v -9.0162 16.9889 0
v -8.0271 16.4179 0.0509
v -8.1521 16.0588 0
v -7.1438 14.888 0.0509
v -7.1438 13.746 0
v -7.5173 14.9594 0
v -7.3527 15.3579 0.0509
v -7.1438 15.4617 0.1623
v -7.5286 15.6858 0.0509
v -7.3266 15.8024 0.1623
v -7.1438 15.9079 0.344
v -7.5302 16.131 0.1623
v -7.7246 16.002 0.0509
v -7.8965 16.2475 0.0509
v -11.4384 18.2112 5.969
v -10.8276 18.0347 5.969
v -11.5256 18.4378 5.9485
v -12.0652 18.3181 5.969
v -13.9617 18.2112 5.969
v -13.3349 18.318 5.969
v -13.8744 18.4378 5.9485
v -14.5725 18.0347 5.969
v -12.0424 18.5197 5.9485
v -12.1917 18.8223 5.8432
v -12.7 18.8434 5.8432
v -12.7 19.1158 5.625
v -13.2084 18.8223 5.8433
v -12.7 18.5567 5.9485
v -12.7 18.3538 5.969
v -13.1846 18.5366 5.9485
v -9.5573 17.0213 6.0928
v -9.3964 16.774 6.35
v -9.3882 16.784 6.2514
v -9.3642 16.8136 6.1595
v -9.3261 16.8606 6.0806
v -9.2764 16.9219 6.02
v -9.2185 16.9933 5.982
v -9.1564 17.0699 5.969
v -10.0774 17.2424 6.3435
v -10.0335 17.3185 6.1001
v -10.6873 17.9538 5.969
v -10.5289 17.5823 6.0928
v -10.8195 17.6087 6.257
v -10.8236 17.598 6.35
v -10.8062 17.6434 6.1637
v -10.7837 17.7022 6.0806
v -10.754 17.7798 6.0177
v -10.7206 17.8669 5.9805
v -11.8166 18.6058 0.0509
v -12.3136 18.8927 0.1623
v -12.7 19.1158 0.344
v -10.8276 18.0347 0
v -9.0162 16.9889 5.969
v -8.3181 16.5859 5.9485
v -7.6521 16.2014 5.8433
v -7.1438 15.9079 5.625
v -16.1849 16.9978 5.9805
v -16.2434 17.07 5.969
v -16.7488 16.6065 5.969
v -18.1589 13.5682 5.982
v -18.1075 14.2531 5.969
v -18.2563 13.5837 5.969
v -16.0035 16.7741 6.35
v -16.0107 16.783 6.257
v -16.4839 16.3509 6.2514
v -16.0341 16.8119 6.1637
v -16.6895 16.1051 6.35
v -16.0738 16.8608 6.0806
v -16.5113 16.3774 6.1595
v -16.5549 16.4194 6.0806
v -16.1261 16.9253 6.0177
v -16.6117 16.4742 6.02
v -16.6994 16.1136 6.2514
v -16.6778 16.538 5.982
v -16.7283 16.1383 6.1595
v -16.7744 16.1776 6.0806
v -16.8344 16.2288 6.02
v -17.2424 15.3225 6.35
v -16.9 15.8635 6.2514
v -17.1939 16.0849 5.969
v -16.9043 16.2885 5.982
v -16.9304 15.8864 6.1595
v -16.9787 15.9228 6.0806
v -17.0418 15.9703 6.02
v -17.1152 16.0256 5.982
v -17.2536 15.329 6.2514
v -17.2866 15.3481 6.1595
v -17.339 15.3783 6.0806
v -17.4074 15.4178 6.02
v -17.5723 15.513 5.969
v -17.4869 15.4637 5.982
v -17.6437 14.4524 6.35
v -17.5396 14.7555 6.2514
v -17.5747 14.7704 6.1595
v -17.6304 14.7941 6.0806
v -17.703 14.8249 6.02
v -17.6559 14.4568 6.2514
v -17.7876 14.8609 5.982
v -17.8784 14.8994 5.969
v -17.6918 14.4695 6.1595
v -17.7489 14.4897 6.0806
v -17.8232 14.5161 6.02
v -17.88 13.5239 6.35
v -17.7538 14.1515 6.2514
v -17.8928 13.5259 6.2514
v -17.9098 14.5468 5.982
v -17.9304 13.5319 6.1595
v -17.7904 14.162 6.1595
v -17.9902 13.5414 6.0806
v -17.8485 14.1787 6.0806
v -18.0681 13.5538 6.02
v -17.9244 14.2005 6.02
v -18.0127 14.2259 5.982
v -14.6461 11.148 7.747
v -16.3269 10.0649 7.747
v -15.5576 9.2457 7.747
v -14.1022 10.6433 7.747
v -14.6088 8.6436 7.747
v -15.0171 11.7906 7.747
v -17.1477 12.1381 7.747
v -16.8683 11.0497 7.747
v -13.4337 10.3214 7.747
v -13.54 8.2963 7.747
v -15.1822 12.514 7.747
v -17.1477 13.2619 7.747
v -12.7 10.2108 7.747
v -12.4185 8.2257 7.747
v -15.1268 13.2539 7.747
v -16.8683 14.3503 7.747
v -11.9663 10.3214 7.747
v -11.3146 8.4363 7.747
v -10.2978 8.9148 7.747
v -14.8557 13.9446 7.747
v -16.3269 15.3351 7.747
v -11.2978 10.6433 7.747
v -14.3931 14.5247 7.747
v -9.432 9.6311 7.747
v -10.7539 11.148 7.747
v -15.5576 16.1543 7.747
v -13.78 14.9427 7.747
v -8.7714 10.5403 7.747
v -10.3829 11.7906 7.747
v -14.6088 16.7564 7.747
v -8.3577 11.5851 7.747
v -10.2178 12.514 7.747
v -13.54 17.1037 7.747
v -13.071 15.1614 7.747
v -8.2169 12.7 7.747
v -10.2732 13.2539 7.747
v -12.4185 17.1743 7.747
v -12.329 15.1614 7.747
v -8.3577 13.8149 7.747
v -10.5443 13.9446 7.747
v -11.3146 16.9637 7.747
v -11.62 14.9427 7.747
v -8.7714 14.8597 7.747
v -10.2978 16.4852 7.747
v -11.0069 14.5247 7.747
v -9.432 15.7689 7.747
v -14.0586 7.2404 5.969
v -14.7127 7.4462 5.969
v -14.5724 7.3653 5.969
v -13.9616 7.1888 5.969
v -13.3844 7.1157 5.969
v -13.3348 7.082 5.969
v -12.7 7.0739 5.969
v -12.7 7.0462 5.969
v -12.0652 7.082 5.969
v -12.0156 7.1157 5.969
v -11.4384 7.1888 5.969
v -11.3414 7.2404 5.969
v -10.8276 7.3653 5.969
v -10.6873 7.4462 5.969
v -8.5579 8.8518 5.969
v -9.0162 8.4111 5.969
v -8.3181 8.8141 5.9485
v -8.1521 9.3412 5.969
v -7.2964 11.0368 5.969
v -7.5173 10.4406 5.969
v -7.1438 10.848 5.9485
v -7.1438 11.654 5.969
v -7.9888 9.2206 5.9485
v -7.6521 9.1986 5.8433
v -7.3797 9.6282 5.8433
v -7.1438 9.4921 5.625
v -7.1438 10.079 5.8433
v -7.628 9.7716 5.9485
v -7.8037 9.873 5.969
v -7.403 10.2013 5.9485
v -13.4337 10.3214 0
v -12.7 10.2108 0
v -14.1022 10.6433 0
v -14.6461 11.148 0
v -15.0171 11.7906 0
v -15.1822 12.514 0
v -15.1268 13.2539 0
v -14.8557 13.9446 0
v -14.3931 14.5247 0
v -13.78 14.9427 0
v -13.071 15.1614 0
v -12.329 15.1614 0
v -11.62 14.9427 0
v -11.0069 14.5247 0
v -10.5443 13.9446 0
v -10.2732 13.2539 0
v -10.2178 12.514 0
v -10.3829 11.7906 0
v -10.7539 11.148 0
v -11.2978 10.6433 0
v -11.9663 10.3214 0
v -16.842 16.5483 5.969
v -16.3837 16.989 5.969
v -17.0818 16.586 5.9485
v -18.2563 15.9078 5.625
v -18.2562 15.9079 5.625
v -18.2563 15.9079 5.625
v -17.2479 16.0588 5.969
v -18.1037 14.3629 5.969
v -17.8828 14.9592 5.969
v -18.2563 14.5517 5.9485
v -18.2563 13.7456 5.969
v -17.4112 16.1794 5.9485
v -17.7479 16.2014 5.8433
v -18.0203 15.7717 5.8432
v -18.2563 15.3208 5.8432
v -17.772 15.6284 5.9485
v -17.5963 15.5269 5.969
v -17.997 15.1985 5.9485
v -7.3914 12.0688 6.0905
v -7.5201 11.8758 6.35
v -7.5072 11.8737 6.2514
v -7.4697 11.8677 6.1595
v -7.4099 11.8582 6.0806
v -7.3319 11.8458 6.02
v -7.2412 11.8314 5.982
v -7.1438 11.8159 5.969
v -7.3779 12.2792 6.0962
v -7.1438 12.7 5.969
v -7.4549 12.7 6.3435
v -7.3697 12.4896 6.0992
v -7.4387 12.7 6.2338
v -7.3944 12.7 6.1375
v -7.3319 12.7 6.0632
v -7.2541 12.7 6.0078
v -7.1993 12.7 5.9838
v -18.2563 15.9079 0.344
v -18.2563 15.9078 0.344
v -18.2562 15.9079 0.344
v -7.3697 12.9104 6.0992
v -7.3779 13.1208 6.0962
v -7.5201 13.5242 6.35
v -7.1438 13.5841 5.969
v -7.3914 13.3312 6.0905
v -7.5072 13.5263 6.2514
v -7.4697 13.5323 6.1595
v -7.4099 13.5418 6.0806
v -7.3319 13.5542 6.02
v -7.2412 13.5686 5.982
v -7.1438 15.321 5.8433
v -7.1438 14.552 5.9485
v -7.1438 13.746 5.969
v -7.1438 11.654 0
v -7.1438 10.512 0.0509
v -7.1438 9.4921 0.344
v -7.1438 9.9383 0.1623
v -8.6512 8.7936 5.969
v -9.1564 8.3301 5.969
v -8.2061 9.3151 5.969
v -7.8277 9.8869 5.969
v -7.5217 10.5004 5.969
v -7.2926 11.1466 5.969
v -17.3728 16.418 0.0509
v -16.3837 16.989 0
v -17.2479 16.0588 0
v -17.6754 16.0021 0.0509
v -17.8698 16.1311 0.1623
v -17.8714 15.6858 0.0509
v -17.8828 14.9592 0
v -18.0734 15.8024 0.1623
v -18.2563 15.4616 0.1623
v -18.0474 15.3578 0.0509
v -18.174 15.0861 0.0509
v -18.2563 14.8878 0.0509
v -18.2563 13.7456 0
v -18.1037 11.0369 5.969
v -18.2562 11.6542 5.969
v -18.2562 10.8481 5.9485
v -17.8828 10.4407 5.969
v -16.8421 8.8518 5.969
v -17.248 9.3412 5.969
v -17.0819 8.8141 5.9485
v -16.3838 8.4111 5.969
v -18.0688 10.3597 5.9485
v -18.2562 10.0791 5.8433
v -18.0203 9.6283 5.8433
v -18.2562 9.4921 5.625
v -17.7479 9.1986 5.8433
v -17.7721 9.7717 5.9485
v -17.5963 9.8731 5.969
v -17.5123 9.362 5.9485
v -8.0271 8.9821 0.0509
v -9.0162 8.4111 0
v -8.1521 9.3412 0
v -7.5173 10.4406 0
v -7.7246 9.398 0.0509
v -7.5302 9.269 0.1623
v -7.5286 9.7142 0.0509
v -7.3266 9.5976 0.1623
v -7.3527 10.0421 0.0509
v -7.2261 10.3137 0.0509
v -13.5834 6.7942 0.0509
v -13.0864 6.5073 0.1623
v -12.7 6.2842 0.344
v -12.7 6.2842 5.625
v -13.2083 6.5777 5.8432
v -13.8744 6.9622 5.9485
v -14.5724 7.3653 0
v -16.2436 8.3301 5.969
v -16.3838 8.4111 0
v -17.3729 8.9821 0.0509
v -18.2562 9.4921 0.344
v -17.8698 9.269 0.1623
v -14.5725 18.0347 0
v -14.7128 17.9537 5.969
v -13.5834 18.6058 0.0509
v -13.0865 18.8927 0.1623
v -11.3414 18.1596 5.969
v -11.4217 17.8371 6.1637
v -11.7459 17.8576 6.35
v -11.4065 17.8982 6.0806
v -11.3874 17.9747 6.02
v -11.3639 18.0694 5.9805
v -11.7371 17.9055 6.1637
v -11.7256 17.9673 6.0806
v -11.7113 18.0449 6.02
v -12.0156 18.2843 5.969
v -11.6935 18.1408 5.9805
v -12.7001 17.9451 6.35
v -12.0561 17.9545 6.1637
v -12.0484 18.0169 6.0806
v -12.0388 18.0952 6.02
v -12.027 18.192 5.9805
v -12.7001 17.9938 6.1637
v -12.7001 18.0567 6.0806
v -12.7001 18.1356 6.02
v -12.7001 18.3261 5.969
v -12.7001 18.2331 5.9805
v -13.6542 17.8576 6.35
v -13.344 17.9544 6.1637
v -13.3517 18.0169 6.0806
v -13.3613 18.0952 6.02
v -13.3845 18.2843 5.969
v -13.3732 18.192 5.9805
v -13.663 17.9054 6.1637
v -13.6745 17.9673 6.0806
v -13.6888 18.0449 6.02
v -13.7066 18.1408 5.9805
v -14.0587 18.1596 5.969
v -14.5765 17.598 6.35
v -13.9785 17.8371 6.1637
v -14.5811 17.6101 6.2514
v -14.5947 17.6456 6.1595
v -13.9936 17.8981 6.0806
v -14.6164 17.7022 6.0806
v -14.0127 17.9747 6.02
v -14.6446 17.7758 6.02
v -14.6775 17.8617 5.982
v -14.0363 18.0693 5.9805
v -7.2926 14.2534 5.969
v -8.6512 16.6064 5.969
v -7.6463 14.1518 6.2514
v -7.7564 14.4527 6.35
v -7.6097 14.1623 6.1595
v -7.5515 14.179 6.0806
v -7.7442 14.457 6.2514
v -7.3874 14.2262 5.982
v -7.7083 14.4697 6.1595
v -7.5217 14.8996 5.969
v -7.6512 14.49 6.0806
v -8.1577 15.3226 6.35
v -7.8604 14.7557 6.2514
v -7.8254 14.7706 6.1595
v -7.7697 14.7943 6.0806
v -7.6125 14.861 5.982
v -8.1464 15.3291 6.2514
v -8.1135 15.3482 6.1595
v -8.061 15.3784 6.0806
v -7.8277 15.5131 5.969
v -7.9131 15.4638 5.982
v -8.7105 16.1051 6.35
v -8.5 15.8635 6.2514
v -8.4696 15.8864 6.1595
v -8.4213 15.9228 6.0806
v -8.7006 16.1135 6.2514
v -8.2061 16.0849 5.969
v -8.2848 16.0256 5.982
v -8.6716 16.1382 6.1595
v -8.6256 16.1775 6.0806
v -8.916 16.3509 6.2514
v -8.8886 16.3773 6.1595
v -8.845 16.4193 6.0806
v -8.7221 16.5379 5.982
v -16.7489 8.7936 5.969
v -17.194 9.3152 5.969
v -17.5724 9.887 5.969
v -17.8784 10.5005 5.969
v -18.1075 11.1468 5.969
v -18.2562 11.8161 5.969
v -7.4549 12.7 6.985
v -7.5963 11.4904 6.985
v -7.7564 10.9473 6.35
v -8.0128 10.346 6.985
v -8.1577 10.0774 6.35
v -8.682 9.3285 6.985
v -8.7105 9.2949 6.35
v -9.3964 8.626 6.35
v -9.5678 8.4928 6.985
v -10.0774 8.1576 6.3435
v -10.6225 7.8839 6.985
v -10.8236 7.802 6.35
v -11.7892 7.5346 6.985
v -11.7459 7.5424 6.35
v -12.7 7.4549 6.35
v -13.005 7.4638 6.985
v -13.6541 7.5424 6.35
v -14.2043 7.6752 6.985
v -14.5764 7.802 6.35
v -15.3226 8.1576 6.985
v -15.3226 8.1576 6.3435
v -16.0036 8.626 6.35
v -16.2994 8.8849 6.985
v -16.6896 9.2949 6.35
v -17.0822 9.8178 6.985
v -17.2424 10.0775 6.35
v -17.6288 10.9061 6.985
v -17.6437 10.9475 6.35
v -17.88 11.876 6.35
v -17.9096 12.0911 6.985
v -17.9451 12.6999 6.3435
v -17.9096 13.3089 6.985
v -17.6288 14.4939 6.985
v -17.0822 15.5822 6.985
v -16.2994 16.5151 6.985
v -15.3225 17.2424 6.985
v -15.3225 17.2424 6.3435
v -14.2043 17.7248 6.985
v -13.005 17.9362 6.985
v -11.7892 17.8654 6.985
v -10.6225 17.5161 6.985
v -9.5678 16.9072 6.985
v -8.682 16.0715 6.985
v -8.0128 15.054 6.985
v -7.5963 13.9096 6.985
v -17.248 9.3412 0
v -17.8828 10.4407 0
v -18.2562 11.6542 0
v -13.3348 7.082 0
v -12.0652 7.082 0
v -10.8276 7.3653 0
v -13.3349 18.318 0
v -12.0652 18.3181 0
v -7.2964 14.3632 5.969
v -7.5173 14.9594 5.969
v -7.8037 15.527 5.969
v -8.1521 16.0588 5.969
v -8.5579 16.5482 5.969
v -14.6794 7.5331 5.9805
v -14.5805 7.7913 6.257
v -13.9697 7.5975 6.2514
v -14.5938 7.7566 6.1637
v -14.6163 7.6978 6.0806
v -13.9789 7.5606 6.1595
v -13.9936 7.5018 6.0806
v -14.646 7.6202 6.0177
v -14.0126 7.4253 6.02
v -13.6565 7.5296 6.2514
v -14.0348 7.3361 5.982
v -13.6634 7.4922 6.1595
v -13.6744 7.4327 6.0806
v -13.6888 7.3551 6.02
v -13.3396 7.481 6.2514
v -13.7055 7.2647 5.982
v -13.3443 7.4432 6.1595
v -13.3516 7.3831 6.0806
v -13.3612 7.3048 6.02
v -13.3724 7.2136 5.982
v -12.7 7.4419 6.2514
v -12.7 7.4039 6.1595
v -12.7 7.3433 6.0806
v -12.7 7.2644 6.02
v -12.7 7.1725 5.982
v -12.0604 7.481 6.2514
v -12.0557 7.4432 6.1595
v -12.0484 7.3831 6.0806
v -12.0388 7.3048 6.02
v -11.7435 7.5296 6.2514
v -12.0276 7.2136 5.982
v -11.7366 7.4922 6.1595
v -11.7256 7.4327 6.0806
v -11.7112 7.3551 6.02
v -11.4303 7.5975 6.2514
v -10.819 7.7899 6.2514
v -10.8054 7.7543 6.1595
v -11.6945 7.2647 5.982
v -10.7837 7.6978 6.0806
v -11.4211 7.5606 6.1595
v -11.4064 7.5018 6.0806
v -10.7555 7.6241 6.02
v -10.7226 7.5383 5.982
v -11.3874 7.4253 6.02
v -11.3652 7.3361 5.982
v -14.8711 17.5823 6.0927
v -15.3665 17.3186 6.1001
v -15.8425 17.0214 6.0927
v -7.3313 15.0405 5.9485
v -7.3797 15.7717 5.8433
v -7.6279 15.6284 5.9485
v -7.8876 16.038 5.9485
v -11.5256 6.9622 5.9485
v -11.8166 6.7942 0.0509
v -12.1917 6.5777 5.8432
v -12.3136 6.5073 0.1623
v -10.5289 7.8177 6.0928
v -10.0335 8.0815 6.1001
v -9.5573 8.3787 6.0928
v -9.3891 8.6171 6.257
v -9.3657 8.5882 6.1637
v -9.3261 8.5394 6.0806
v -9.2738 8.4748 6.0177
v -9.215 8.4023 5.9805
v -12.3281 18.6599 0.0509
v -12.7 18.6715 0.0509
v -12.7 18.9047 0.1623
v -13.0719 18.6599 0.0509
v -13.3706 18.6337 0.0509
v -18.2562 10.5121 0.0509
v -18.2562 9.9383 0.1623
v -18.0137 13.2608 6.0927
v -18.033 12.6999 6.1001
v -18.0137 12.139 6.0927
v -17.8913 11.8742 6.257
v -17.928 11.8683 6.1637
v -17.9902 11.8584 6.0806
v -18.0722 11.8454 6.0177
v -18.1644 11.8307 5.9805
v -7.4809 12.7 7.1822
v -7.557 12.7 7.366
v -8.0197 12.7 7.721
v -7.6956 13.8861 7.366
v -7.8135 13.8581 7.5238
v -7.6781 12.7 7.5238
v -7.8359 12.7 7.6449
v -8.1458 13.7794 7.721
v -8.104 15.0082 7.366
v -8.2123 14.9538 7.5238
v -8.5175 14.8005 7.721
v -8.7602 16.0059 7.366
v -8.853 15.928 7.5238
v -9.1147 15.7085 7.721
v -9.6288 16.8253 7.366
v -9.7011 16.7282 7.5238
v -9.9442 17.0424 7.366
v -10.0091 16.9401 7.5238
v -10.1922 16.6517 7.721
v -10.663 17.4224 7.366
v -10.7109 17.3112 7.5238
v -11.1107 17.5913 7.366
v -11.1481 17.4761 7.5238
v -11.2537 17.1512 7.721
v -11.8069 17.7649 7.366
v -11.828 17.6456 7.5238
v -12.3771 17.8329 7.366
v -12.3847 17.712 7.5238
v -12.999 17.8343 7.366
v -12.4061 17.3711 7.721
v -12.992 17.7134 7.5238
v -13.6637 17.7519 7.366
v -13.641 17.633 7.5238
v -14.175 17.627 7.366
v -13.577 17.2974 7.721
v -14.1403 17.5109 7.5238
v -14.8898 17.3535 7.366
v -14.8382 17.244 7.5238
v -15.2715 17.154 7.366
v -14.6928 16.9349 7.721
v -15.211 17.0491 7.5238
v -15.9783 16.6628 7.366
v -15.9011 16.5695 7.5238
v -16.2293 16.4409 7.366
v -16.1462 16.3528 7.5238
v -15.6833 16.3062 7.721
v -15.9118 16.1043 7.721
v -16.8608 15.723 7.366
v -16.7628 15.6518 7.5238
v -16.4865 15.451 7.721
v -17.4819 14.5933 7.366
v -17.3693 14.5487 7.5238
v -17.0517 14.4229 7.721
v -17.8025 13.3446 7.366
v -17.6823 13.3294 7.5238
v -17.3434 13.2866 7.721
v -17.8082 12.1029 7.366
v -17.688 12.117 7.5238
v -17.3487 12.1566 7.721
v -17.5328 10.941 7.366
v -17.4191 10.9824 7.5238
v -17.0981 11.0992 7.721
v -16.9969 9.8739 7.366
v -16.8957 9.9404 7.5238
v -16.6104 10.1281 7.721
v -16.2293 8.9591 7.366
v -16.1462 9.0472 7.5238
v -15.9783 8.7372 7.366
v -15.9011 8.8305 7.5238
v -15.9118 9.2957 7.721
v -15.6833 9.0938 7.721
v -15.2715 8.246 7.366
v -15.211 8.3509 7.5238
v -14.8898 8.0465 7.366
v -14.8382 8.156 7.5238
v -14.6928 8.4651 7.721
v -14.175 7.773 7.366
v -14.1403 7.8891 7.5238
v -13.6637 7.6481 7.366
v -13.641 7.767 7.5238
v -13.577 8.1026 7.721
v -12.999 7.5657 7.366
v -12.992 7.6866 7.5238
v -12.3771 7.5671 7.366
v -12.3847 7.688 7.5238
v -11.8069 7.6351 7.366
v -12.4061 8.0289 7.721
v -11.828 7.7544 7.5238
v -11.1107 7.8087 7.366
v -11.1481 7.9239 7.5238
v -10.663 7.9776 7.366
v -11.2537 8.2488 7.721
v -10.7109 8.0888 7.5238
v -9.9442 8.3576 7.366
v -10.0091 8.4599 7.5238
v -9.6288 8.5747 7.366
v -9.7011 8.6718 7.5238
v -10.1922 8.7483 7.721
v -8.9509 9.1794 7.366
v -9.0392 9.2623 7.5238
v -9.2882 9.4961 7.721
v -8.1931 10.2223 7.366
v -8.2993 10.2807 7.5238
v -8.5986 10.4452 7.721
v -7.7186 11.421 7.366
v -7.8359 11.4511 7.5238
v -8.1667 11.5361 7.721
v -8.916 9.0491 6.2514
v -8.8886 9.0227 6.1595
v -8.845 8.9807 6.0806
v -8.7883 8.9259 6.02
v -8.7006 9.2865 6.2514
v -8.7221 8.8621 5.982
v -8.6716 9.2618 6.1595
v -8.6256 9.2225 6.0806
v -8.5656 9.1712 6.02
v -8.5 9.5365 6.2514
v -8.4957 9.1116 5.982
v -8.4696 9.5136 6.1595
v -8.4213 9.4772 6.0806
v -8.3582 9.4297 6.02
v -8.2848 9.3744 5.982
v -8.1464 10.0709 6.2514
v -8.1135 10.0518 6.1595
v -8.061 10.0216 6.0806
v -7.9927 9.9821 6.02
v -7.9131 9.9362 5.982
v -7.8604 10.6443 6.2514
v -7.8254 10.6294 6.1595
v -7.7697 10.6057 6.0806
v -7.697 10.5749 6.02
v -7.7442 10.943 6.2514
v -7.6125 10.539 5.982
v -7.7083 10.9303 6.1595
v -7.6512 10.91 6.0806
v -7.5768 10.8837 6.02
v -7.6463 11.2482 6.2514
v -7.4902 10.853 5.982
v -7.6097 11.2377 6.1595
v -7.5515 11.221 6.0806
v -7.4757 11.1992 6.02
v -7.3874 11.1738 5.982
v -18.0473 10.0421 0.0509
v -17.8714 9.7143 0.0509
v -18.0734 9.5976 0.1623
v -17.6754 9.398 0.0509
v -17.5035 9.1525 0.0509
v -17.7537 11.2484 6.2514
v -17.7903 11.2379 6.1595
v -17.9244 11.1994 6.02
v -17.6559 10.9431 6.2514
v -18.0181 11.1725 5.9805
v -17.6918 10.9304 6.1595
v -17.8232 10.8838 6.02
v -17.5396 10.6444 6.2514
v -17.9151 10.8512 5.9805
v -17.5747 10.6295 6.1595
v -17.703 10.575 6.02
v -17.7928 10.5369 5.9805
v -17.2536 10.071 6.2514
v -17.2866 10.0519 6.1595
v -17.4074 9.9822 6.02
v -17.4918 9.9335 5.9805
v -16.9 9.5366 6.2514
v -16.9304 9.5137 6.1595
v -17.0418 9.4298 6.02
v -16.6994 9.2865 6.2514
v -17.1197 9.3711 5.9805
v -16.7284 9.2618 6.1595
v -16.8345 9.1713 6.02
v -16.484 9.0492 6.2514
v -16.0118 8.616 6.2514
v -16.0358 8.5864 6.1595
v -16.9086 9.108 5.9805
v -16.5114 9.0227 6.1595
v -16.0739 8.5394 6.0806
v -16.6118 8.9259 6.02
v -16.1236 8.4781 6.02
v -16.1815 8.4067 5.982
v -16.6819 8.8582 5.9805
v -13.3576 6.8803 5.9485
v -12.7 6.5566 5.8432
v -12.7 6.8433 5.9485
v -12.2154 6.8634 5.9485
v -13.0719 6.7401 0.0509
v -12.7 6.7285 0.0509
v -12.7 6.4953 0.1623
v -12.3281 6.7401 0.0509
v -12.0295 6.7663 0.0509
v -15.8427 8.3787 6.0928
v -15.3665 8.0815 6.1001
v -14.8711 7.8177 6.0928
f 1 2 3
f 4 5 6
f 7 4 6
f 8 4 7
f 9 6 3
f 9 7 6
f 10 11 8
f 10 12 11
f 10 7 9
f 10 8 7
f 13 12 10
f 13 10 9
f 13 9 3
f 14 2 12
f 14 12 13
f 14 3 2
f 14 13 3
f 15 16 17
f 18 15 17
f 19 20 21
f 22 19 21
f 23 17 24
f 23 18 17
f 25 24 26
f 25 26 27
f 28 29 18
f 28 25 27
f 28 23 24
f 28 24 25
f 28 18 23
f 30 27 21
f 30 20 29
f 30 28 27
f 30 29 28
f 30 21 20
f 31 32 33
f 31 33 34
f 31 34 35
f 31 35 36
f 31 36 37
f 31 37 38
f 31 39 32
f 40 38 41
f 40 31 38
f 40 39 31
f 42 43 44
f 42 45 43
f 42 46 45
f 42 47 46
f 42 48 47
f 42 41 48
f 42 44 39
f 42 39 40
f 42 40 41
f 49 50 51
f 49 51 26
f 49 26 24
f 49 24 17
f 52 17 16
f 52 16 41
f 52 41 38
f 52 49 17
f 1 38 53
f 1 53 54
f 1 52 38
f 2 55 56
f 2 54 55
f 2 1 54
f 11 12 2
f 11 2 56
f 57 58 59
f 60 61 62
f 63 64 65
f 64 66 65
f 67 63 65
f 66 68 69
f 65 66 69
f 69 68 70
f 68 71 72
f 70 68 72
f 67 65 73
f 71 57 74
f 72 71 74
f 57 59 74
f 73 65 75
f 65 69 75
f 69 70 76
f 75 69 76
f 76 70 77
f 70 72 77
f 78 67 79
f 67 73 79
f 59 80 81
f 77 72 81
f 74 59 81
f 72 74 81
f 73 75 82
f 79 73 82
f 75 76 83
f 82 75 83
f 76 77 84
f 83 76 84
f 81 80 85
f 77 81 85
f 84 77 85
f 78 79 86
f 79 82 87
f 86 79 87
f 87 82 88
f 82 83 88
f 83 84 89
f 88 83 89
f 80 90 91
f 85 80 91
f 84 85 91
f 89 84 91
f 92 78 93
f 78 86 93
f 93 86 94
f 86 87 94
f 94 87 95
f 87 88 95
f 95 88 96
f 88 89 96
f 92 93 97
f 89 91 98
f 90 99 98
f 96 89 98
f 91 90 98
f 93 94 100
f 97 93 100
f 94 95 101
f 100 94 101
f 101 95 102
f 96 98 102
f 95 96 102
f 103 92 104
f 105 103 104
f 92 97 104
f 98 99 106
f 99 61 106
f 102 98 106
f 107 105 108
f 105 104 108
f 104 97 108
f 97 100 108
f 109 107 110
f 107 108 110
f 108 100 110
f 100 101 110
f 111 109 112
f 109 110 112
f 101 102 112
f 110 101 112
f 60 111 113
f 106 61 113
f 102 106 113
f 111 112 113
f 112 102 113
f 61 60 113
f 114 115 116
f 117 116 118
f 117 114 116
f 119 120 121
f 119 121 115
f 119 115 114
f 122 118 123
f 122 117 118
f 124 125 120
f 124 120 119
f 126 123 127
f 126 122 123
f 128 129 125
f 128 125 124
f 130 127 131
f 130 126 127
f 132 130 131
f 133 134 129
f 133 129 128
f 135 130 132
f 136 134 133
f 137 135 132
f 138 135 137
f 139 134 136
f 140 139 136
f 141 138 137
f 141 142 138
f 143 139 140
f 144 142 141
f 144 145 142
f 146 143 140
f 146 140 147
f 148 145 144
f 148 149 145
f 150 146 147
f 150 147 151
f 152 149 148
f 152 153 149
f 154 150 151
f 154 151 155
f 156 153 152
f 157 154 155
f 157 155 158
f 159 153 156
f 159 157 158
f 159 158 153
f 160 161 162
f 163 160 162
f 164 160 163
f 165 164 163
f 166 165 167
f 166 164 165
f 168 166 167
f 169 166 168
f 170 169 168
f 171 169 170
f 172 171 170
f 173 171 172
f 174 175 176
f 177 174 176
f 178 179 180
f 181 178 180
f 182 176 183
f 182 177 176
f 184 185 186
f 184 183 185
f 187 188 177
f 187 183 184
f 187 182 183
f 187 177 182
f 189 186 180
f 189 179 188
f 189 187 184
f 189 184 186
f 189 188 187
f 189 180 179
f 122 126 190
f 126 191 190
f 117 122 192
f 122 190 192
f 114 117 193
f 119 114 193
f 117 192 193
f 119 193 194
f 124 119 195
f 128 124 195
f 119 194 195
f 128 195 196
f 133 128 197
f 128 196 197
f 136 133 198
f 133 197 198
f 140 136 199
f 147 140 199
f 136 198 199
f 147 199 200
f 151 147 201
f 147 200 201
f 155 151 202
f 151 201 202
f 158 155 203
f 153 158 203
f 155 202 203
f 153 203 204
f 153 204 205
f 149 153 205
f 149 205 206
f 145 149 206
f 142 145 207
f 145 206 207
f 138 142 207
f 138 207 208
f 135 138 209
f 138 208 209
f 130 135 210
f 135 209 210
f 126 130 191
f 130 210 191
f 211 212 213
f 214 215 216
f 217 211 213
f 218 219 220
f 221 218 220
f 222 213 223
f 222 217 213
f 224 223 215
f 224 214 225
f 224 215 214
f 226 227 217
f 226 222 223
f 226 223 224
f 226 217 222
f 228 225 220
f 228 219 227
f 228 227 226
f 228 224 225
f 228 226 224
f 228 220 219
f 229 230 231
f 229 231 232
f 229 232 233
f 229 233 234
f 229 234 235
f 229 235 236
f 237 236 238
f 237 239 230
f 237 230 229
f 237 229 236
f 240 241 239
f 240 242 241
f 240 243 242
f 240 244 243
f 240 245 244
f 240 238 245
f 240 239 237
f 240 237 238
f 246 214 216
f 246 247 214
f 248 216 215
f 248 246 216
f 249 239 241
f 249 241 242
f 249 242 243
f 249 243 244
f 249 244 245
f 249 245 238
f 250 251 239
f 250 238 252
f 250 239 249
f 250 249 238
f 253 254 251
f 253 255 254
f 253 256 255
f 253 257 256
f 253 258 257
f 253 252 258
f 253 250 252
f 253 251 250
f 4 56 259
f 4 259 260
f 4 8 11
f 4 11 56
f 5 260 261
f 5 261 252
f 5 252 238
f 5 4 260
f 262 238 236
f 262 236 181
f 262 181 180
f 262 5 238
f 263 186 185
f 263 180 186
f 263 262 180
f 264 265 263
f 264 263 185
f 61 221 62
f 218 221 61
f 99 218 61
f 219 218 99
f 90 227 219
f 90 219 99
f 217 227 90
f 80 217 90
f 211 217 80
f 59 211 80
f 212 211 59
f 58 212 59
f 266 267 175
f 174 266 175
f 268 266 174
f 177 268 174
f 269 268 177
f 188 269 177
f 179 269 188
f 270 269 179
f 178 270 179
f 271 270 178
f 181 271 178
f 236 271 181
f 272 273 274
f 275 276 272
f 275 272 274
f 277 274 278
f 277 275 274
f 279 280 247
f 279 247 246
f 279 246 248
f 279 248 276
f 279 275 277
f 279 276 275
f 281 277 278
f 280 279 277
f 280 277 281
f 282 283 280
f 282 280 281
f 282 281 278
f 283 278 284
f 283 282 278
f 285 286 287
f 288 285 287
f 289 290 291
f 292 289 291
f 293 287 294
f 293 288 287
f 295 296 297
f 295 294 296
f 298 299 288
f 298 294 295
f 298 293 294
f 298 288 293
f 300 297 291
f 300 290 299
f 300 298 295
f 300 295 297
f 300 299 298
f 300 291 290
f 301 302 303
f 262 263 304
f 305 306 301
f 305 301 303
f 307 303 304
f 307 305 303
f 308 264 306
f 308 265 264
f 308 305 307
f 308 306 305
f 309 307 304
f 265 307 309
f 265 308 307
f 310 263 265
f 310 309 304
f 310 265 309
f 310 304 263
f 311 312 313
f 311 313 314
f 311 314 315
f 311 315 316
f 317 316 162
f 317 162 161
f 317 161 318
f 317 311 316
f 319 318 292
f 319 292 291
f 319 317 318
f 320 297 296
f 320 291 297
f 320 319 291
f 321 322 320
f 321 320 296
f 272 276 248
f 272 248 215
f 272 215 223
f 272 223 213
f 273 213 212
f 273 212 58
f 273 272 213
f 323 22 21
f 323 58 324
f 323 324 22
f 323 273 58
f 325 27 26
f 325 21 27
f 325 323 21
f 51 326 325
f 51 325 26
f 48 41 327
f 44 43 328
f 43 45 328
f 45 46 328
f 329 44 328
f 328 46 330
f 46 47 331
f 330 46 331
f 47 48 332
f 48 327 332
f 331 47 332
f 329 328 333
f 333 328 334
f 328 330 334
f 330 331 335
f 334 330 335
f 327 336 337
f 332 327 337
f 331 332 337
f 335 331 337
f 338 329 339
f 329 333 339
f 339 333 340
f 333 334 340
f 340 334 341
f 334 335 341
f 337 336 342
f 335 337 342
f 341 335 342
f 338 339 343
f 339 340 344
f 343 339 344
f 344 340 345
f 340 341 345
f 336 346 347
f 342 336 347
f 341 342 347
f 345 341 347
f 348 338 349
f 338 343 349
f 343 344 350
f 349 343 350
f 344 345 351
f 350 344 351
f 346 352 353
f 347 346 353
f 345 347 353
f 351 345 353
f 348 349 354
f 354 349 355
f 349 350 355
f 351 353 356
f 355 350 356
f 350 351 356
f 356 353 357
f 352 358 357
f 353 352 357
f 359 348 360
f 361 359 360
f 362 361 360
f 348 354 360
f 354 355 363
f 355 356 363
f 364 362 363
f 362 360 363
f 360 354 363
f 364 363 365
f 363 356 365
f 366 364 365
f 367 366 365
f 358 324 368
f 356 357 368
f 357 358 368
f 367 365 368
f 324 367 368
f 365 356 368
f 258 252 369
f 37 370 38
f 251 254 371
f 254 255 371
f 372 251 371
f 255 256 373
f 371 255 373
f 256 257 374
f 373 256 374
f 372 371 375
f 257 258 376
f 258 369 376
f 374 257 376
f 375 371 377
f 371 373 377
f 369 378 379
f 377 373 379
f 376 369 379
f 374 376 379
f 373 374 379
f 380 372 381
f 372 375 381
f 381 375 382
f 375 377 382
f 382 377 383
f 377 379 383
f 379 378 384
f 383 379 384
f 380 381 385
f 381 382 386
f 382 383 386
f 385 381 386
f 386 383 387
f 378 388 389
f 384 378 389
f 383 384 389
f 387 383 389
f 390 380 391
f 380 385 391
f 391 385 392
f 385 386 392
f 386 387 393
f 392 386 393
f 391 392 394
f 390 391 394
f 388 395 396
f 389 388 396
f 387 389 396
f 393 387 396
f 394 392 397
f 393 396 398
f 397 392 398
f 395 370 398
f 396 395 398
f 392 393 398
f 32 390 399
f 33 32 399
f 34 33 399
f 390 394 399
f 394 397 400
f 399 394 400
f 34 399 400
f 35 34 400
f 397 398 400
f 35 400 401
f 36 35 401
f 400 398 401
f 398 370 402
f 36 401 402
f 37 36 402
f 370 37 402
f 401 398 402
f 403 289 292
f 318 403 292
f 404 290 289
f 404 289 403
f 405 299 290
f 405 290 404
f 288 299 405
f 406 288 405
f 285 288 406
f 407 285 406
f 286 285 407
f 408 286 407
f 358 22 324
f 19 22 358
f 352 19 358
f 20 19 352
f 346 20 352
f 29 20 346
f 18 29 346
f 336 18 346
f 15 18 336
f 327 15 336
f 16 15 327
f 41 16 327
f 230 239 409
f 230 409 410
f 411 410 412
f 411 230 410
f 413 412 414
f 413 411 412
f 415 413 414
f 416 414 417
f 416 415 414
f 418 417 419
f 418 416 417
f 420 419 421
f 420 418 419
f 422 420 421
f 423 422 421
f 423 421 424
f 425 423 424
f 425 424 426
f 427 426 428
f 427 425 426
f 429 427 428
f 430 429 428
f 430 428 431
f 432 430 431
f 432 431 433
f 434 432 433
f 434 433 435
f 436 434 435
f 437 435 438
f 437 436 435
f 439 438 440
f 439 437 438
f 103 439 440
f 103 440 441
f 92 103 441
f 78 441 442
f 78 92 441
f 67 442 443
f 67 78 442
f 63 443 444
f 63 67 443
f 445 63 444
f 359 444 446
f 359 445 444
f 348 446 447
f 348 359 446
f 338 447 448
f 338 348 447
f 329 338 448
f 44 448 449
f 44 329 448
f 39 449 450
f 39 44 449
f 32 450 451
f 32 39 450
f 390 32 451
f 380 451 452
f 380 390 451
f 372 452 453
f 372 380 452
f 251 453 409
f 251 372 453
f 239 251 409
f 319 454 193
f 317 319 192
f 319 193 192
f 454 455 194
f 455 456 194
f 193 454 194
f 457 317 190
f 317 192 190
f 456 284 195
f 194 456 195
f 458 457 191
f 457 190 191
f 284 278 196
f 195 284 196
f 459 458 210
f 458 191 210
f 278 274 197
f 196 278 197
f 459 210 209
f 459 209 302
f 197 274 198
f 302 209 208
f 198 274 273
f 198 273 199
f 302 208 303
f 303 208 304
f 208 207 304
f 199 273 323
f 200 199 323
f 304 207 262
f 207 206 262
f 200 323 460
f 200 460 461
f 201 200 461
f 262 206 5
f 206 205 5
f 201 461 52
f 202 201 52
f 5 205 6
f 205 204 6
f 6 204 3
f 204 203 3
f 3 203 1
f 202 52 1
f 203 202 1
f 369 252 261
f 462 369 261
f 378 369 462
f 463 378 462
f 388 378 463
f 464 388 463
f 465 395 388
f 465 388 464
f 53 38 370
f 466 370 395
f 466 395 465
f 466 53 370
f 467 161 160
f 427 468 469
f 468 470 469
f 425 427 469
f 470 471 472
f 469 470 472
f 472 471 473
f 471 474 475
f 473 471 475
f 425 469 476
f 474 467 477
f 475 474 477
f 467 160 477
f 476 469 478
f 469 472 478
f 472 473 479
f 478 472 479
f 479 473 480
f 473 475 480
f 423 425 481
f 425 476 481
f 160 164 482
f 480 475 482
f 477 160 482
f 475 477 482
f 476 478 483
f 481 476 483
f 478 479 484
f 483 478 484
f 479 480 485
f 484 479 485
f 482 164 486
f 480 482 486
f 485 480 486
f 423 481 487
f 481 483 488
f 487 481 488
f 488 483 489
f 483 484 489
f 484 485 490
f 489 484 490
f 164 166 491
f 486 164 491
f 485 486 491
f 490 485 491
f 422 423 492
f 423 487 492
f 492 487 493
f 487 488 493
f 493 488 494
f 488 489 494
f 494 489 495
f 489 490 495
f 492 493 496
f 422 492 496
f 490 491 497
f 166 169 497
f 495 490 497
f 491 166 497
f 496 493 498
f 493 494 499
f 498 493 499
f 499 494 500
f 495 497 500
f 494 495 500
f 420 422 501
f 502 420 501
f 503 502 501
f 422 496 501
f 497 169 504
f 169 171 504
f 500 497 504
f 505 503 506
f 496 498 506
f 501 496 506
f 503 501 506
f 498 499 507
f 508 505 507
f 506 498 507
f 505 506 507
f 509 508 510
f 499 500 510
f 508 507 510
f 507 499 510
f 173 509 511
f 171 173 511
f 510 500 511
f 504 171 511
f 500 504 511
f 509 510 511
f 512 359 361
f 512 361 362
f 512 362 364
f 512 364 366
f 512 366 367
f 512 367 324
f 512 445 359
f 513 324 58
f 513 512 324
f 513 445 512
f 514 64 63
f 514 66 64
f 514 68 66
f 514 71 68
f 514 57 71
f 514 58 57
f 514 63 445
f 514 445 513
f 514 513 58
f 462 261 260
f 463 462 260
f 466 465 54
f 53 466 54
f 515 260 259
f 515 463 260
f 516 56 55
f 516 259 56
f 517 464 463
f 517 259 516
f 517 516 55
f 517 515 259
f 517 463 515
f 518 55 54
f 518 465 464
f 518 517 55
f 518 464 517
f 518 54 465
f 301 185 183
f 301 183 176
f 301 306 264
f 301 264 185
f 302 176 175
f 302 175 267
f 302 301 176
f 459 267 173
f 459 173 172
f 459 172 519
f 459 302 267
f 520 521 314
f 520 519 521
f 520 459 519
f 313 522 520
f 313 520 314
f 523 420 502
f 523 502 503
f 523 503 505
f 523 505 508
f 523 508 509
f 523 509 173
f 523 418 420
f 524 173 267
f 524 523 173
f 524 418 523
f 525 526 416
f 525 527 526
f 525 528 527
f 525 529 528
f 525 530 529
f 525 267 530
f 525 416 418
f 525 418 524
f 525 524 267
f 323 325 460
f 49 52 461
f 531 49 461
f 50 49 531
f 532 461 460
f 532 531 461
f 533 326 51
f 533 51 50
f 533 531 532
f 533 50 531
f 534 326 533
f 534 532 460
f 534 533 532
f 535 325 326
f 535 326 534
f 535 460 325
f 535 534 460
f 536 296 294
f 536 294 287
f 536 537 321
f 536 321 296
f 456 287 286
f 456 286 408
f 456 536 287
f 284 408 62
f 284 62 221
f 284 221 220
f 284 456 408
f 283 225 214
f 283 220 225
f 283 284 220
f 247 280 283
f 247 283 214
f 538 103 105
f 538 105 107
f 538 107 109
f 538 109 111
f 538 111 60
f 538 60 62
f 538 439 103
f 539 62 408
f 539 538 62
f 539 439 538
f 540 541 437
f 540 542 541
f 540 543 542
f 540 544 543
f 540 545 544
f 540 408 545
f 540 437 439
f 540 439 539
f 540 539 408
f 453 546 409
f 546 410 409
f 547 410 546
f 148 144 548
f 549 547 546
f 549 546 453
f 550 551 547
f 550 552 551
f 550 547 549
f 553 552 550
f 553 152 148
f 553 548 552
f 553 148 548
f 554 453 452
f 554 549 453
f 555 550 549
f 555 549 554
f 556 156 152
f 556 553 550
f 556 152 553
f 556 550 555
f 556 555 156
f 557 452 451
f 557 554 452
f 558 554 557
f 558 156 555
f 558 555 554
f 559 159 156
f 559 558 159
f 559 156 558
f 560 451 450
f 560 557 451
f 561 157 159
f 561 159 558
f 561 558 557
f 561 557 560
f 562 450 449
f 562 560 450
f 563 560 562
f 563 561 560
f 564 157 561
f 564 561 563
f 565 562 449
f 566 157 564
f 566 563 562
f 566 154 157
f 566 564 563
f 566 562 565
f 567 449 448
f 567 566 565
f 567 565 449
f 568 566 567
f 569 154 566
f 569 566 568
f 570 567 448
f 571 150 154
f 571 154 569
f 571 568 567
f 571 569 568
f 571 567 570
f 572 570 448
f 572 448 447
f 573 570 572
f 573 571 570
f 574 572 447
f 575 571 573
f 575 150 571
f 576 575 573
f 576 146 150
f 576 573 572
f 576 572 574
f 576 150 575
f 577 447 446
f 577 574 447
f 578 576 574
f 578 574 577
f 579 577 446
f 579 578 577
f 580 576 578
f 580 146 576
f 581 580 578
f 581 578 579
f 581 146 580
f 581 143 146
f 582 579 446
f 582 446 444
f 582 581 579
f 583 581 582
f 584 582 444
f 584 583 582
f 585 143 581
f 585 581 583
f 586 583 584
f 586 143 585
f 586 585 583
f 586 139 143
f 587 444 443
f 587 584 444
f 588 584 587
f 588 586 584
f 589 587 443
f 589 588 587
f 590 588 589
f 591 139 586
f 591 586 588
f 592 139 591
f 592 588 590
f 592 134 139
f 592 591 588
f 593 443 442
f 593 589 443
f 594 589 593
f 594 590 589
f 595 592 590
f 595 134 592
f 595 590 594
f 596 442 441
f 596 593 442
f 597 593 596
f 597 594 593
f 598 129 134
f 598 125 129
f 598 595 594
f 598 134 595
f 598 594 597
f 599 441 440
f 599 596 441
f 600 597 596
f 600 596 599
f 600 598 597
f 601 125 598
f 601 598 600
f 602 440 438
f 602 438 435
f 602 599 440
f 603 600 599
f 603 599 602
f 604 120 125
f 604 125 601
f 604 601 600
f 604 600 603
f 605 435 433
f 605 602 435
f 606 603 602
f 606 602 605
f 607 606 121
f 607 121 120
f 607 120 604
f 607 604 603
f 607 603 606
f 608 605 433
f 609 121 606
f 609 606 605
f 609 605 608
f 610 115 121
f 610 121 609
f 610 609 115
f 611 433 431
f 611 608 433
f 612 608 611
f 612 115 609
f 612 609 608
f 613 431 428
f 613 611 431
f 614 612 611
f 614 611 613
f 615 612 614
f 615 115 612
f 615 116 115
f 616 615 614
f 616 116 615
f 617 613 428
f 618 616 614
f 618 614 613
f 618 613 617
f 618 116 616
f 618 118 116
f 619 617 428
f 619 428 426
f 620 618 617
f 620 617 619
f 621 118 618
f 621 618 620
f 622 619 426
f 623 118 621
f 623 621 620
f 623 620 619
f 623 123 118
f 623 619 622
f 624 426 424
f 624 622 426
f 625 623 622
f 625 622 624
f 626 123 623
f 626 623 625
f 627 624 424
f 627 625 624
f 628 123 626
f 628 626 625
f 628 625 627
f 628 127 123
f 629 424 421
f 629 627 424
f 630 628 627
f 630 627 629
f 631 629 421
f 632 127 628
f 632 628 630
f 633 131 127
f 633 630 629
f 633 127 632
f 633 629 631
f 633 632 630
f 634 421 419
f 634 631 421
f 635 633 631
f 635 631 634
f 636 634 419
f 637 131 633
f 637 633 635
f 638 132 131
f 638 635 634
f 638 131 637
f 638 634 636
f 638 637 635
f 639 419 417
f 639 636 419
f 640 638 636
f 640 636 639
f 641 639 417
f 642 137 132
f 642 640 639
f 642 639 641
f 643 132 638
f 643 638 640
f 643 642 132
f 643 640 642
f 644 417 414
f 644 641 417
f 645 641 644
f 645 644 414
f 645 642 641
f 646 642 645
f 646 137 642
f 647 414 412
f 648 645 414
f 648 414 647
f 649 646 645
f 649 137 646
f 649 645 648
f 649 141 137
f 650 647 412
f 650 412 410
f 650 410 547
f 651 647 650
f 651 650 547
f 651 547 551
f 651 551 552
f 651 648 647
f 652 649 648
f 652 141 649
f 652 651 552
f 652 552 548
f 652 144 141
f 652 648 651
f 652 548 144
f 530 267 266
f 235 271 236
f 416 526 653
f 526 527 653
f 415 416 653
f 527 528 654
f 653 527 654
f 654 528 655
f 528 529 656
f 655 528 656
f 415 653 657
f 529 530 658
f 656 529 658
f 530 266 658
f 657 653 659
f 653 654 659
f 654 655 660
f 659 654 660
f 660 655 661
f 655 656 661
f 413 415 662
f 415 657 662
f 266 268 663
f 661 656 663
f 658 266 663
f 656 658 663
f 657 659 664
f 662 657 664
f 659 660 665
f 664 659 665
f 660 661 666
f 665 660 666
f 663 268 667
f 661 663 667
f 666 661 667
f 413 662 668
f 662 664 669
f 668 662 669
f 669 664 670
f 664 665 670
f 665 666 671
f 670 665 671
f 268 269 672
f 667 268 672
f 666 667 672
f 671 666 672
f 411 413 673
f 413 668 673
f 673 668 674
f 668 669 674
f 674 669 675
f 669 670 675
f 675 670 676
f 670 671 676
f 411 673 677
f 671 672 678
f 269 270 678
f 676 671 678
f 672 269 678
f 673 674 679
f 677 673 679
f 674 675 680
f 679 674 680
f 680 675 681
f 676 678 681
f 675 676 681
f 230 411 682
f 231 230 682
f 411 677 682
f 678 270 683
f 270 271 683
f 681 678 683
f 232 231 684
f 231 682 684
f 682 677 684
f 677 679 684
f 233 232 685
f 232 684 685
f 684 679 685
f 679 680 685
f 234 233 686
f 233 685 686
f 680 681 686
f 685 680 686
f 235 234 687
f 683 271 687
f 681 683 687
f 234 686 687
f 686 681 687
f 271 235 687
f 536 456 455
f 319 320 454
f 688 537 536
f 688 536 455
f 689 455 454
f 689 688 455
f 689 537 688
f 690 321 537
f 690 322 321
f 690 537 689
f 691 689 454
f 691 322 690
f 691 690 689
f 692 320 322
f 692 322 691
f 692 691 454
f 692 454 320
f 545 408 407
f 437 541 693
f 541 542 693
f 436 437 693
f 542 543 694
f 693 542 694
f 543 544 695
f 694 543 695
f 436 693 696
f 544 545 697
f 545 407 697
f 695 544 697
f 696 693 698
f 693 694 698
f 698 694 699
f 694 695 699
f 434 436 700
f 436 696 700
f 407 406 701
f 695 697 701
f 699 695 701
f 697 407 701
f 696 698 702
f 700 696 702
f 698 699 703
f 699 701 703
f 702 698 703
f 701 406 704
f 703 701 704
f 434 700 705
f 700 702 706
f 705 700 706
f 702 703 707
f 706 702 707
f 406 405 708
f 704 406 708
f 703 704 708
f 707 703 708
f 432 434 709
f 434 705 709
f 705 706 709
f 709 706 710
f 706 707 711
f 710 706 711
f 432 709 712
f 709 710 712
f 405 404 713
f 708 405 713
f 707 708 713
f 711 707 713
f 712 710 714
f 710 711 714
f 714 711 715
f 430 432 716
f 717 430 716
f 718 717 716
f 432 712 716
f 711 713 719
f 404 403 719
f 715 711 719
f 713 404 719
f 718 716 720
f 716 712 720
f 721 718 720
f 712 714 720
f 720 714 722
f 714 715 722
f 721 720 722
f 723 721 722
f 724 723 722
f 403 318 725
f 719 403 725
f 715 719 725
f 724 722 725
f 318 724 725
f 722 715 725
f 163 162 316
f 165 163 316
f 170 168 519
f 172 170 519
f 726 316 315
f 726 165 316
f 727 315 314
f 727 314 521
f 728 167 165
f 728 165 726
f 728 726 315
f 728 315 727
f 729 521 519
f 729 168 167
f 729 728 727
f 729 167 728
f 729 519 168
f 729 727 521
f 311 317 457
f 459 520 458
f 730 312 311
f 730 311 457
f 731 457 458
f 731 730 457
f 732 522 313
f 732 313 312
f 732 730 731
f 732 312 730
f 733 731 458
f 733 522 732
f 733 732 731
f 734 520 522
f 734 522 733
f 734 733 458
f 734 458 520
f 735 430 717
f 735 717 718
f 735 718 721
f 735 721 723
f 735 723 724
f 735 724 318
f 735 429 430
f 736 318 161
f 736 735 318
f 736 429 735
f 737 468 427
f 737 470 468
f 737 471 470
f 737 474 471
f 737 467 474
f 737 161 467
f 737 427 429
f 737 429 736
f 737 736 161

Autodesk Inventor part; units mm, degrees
ref_plane "YZ Plane" through (0, 0, 0) normal (1, 0, 0) x (0, 1, 0)
ref_plane "XZ Plane" through (0, 0, 0) normal (0, 1, 0) x (-1, 0, 0)
sketch "Sketch1" plane through (0, 0, 0) normal (0, 0, 1) x (1, 0, 0)
  line L0 (-12.7, 6.2842) -> (-18.2562, 9.4921)
  line L1 (-18.2562, 9.4921) -> (-18.2563, 15.9079)
  line L2 (-18.2563, 15.9079) -> (-12.7, 19.1158)
  line L3 (-12.7, 19.1158) -> (-7.1438, 15.9079)
  line L4 (-7.1438, 15.9079) -> (-7.1438, 9.4921)
  line L5 (-7.1438, 9.4921) -> (-12.7, 6.2842)
  point P0 (-12.7, 12.7)
  dimension "d0" = 11.1125
extrude "Extrusion1" add sketch "Sketch1" along normal blind 5.969
ref_plane "Work Plane1" through (-12.7, 19.1158, 5.969) normal (-1, 0, 0) x (0, 0, -1)
sketch "Sketch3" plane through (-12.7, 19.1158, 5.969) normal (-1, 0, 0) x (0, 0, -1)
  line L0 (0, 12.8316) -> (5.969, 12.8316) projected
  line L1 (5.969, 12.8316) -> (5.969, 0) projected
  line L2 (5.969, 0) -> (0, 0) projected
  line L3 (0, 0) -> (0, 12.8316) projected
  line L4 (0, 12.0696) -> (0, 6.4158)
  line L5 (0, 6.4158) -> (5.969, 6.4158)
  line L6 (5.969, 6.4158) -> (5.969, 12.0696)
  arc A0 (5.969, 12.0696) -> (5.625, 12.8316) centre (4.953, 12.0696) ccw
  arc A1 (0.344, 12.8316) -> (0, 12.0696) centre (1.016, 12.0696) ccw
  line L7 (0.344, 12.8316) -> (5.625, 12.8316)
  line L8 (5.969, 12.8316) -> (5.969, 9.6237) projected
  line L9 (0, 12.8316) -> (0, 9.6237) projected
  line L10 (0, 9.6237) -> (0, 3.2079) projected
  dimension "d4" = 1.016
  dimension "d5" = 0.762
  dimension "d6" = 0.762
revolve "Revolution1" cut sketch "Sketch3" angle 360 about axis through (-12.7, 12.7, 5.969) along (0, 0, -1) keep common part contours L0 A0 L1 L5 L3 A1
sketch "Sketch4" plane through (0, 0, 5.969) normal (0, 0, 1) x (1, 0, 0)
  arc A0 (-16.3838, 16.989) -> (-18.2562, 13.7458) centre (-12.7, 12.7) ccw projected
  circle A1 centre (-12.7, 12.7) radius 5.2451
  dimension "d8" = 10.4902
extrude "Extrusion2" add sketch "Sketch4" along normal blind 1.778
fillet "Fillet1" radius 0.762 1 edges at (-17.9451, 12.7, 7.747)
fillet "Fillet2" radius 0.381 1 edges at (-17.9451, 12.7, 5.969)
hole "Hole1" at (-12.7, 12.7, 7.747) direction (0, 0, -1) diameter 4.9784 end through all thread size "1/4-20 UNC" class "2B" standard "ANSI Unified Screw Threads"
properties part number "HW-00002"
